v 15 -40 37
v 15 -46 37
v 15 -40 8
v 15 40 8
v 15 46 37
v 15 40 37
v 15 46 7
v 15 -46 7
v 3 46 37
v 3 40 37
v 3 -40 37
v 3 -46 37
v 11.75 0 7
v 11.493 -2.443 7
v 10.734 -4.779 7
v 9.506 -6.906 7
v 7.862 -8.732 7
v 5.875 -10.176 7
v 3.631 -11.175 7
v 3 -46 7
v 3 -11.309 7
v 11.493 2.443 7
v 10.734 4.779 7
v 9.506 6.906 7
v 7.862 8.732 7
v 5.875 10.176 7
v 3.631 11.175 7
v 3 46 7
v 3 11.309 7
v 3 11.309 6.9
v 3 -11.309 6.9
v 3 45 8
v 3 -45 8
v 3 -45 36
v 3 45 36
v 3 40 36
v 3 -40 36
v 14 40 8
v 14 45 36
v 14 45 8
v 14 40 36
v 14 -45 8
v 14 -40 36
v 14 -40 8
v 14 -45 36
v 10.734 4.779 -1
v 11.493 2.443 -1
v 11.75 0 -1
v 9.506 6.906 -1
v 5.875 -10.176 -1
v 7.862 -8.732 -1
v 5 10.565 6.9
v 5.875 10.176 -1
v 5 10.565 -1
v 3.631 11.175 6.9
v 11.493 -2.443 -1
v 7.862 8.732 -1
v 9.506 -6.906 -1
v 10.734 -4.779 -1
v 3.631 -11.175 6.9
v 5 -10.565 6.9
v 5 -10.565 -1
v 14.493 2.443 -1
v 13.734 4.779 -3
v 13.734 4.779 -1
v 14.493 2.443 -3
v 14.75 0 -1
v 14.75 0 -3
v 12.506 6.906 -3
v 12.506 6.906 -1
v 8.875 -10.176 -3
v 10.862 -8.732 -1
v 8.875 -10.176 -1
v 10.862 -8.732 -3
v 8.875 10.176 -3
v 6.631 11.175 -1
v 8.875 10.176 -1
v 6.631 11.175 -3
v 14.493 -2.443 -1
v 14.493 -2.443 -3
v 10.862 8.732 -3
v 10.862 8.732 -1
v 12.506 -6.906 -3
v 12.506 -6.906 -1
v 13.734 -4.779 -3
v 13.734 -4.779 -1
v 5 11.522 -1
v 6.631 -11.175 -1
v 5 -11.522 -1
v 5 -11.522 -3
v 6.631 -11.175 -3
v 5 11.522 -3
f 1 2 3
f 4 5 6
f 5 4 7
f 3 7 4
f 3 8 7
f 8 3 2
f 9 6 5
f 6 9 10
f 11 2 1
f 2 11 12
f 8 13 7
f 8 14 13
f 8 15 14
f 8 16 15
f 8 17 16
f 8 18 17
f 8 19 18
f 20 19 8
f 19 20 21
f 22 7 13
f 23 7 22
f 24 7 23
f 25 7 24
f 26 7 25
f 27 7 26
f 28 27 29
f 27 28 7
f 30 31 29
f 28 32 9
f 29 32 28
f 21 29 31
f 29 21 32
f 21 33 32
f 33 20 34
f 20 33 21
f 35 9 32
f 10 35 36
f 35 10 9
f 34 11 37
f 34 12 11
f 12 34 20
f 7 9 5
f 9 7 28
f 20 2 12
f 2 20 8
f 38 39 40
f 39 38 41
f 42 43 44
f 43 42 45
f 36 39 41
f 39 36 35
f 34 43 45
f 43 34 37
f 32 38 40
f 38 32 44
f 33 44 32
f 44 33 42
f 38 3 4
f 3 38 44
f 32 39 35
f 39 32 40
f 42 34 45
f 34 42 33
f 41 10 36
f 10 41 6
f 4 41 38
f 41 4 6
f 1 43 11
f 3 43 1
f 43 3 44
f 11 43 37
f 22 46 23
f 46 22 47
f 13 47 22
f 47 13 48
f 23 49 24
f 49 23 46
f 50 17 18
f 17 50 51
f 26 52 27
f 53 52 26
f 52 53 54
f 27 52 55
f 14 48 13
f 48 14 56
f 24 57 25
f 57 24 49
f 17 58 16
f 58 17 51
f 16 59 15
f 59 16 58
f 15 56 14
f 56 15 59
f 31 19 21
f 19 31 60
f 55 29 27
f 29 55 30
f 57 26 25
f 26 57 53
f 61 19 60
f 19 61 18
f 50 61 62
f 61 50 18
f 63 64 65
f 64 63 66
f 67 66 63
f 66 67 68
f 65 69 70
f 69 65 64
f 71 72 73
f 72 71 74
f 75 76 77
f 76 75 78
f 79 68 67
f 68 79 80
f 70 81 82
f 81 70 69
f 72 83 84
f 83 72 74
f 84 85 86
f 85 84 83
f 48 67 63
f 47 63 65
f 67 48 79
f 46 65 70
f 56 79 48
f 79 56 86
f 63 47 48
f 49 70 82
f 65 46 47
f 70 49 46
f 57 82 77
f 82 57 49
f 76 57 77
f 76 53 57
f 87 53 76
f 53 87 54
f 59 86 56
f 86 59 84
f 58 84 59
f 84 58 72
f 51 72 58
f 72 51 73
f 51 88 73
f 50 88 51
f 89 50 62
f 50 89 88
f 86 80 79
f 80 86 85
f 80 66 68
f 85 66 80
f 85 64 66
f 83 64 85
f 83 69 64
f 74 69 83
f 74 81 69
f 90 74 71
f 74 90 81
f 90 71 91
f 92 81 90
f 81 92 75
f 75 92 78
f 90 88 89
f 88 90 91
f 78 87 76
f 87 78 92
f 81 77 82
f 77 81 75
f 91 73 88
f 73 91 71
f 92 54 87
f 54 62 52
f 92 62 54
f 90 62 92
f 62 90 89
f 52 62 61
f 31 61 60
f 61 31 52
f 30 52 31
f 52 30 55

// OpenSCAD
/**
 * This work is licensed under a <a rel="license" href="https://creativecommons.org/licenses/by-sa/4.0/">Creative Commons Attribution 4.0 Unported License</a>.
 */

difference() {
    union() {
        translate([0, 0, -2.1]) {
            cylinder(r = 11.75, h = 10);
        }
        translate([3, 0, -3]) {
            cylinder(r = 11.75, h = 2);
        }
        difference() {
            translate([3, -46, 7]) {
                cube([12, 92, 30]);
            }
            translate([-14, -45, 8]) {
                cube([28, 90, 28]);
            }
            translate([-28, -45, 8]) {
                cube([40, 90, 28]);
            }
            translate([-40, -40, 8]) {
                cube([80, 80, 30]);
            }
        }
    }
    translate([-15, -15, -13.1]) {
        cube([20, 30, 20]);
    }
    translate([-77, -50, 0]) {
        cube([80, 100, 100]);
    }
}
